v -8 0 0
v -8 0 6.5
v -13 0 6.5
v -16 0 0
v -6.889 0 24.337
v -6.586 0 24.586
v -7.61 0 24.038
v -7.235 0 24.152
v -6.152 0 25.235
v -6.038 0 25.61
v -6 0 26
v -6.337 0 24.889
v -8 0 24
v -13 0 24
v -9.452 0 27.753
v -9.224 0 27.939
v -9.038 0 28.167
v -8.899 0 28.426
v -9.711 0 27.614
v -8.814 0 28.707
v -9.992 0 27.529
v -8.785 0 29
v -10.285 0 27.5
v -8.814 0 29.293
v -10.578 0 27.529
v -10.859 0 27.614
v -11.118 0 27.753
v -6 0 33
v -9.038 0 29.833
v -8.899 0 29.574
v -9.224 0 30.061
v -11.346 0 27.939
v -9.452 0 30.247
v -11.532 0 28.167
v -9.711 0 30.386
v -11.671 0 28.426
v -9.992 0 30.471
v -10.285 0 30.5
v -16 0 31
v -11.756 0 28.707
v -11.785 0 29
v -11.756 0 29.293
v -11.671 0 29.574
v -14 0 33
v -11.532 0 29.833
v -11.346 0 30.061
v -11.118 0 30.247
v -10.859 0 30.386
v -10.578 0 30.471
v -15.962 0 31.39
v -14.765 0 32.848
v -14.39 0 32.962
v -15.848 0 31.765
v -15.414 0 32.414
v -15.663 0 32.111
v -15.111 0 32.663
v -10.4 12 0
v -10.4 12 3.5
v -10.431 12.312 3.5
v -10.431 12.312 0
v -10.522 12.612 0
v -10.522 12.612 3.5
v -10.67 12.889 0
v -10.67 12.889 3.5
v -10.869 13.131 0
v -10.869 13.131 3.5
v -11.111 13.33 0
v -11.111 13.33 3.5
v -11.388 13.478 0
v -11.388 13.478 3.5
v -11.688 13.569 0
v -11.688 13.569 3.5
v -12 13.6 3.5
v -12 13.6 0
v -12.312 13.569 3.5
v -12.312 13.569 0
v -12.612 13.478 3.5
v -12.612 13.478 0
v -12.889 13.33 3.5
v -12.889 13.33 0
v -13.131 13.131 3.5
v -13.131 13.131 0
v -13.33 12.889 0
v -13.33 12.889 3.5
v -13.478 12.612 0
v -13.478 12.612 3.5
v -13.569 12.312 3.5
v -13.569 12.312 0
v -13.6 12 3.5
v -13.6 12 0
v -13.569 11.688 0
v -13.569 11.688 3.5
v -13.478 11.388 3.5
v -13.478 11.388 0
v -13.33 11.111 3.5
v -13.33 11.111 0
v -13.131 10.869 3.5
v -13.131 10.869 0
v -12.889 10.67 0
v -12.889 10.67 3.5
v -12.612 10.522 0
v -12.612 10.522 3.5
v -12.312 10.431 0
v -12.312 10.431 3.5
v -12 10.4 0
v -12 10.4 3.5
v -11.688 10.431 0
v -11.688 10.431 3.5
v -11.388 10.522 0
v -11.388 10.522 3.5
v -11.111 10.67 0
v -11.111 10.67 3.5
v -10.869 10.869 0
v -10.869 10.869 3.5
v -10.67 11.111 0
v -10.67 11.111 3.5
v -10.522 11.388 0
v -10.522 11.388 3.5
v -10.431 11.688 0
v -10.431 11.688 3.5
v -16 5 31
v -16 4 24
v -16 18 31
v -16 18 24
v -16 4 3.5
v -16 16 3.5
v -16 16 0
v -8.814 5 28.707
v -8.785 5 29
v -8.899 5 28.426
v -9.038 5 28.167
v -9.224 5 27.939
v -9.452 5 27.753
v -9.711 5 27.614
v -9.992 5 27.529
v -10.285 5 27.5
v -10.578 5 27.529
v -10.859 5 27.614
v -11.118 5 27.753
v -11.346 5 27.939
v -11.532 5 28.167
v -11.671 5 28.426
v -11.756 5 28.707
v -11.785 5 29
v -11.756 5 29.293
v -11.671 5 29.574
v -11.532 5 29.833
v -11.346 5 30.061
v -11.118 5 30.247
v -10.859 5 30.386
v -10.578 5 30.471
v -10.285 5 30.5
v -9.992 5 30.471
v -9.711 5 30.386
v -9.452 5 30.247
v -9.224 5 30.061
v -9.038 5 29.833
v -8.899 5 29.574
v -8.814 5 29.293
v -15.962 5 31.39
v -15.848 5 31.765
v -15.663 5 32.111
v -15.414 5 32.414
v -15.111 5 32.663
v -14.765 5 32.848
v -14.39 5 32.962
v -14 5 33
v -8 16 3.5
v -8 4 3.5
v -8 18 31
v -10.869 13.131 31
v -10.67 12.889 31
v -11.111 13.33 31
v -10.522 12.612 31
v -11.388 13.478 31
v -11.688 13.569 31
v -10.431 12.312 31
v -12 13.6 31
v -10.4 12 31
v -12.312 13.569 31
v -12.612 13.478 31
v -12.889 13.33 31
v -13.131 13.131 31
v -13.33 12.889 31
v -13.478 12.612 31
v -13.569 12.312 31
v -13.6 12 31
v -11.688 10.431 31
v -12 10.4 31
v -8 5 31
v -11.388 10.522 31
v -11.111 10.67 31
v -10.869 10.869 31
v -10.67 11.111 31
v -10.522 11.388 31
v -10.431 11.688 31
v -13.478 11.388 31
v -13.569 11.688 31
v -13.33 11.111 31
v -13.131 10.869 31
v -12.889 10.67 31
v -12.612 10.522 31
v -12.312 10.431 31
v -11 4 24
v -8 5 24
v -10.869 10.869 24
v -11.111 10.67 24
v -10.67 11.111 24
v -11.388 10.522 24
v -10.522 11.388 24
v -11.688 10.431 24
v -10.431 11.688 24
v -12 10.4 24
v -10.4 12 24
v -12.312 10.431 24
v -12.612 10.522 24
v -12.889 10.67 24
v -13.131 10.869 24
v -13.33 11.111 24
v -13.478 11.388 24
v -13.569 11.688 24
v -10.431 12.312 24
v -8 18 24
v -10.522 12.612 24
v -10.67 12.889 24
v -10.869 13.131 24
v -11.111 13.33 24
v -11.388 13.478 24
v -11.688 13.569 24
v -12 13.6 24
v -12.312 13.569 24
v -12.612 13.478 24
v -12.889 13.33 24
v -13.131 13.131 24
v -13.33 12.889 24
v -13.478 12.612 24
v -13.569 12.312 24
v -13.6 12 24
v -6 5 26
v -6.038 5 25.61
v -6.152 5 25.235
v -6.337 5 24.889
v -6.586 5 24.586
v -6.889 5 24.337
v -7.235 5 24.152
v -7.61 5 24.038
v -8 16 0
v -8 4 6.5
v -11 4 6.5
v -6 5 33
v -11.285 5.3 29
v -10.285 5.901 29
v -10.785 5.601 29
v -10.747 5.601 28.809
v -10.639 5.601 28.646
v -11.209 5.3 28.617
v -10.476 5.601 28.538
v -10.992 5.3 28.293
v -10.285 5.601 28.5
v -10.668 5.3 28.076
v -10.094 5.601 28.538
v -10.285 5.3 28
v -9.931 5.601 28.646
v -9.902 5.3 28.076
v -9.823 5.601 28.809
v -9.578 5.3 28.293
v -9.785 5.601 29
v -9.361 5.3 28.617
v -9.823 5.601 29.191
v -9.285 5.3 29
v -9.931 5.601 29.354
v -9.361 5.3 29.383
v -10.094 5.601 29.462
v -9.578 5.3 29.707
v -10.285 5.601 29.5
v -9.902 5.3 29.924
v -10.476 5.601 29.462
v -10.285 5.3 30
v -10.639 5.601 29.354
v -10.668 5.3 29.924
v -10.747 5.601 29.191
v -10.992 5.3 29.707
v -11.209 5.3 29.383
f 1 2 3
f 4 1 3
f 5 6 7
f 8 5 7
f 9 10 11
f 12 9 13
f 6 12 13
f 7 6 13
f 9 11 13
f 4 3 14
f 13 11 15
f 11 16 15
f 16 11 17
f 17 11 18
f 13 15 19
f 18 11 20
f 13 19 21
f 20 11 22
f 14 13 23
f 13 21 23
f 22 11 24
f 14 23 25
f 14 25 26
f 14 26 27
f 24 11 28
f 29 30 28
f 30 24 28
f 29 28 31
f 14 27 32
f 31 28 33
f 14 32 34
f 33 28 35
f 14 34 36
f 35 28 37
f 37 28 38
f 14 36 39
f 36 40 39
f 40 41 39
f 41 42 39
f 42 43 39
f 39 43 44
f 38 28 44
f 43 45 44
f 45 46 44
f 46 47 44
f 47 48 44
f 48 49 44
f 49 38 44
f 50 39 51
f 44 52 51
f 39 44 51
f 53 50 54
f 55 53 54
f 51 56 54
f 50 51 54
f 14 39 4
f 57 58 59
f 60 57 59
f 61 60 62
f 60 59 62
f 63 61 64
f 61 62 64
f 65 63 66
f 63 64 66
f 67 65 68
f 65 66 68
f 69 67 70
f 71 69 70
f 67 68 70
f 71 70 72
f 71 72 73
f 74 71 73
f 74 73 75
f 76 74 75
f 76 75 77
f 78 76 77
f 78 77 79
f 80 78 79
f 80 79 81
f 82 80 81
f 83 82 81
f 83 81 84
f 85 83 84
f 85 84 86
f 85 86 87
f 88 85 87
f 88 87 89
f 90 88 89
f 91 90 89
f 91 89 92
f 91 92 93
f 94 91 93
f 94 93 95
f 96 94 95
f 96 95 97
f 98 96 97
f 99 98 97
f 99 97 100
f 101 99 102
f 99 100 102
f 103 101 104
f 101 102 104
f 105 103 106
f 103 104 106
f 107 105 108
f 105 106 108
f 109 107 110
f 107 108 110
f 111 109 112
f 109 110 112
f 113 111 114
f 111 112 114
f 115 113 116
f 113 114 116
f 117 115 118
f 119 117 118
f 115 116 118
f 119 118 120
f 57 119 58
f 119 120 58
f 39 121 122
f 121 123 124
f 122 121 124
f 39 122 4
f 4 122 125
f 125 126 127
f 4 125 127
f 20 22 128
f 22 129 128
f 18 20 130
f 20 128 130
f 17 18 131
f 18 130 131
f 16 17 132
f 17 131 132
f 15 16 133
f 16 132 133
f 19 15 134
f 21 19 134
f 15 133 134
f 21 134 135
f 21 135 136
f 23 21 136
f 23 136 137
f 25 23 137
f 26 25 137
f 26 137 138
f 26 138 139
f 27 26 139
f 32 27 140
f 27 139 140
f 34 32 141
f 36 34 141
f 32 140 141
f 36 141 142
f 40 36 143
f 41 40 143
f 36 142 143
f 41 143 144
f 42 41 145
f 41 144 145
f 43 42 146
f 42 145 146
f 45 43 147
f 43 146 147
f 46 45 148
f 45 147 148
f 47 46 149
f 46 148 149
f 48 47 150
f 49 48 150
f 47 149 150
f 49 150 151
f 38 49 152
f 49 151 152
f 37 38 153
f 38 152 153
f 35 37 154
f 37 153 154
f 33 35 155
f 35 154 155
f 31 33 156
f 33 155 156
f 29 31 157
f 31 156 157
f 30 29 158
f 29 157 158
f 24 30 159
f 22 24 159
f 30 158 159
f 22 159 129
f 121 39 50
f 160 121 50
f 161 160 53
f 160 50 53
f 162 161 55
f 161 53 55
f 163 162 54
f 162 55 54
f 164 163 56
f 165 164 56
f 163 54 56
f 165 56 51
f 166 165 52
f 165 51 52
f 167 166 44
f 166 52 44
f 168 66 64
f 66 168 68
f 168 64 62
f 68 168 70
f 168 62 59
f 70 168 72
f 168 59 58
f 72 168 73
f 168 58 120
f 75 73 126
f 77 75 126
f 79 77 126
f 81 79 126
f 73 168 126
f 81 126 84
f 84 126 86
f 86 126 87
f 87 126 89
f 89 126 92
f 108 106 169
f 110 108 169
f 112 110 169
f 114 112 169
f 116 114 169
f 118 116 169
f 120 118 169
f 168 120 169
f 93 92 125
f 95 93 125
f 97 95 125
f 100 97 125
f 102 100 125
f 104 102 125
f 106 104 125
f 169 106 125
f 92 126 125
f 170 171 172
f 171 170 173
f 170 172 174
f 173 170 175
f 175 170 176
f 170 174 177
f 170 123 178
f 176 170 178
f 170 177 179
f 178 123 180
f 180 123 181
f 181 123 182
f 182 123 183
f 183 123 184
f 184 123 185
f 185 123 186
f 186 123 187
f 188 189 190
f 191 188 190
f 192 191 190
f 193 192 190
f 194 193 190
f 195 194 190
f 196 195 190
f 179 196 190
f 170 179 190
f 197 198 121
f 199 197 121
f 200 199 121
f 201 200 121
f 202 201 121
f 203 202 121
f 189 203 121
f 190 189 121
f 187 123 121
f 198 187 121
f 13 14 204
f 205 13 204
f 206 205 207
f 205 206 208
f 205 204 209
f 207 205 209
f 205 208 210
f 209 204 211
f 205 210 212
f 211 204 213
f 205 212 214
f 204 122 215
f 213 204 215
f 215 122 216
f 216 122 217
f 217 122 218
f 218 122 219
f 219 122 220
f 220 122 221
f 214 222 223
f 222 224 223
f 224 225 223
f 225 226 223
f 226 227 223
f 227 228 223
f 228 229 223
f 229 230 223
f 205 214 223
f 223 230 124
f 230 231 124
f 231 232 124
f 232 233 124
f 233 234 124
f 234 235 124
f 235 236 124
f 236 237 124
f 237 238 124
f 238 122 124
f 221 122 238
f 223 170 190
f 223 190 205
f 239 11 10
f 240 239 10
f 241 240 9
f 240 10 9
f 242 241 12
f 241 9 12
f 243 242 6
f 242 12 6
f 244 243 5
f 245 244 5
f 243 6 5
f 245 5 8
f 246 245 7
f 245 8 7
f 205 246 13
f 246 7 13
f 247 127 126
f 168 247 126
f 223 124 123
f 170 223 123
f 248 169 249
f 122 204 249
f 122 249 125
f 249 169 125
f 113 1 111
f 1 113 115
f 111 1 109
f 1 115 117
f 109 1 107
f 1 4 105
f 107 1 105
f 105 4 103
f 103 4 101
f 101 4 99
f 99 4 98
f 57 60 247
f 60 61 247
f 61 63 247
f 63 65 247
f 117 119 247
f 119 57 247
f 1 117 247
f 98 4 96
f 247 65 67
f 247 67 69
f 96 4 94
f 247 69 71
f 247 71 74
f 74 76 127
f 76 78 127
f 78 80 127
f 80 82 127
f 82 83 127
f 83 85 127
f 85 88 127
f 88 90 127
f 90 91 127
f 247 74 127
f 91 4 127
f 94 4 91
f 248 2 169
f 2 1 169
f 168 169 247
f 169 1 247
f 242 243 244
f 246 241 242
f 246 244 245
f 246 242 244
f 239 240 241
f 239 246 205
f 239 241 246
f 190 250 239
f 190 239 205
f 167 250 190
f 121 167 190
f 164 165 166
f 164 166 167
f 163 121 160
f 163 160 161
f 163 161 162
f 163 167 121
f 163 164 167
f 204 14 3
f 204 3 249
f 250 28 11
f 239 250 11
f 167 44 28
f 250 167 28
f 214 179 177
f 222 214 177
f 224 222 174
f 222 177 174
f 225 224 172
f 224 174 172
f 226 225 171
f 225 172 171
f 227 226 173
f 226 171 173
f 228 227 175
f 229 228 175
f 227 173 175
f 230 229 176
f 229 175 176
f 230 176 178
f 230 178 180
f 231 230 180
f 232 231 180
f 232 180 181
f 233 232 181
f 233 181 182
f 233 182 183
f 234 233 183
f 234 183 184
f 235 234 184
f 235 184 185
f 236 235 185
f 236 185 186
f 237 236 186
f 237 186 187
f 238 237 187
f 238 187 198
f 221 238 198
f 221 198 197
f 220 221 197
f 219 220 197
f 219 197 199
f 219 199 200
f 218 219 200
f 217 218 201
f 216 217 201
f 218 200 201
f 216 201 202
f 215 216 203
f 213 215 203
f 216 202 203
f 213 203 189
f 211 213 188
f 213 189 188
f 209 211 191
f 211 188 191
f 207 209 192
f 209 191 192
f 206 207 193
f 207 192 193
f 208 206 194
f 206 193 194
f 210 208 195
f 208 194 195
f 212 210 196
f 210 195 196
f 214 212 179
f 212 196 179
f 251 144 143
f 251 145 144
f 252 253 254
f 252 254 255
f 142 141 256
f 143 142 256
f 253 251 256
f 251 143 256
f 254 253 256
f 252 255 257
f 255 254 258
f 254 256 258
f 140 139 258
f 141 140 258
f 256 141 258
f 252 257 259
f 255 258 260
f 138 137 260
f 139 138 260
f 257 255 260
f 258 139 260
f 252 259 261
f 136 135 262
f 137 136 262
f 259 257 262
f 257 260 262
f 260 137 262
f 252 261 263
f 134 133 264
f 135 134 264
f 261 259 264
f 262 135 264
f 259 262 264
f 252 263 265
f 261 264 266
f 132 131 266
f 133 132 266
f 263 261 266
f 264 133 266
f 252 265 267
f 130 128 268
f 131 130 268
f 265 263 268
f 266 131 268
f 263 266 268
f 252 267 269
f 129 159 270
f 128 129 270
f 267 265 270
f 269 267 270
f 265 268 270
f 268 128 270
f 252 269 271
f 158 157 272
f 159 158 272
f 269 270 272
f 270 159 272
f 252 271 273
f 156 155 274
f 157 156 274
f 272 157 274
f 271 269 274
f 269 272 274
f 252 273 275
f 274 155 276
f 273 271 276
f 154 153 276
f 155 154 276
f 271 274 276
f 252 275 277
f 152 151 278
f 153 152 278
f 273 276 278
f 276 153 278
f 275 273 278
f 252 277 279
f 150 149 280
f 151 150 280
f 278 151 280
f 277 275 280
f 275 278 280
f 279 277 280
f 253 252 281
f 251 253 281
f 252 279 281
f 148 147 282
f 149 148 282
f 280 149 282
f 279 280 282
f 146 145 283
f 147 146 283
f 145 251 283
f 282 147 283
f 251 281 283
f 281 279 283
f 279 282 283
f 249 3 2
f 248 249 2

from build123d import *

# Parameters (mm, degrees)
BOSS_EXTRUDE1_DEPTH       = 8
CUT_EXTRUDE2_DEPTH        = 20.5
SKETCH6_W                 = 35.270415117
SKETCH6_H                 = 22.226622545
CUT_EXTRUDE3_DEPTH        = 8
BOSS_EXTRUDE2_DEPTH       = 3
BOSS_EXTRUDE7_DEPTH       = 5
SKETCH7_R                 = 1.6
CUT_EXTRUDE6_DEPTH        = 40.255572853
F_3_0MM_DOWEL_HOLE1_D     = 3
F_3_0MM_DOWEL_HOLE1_DEPTH = 5
F_3_0MM_DOWEL_HOLE1_TIP   = 0.901290929


with BuildPart() as part:
    # Sketch1 → Boss-Extrude1 (new body)
    with BuildSketch(Plane(origin=(0, 0, 0), x_dir=(0, 0, -1), z_dir=(1, 0, 0))):
        Polygon((0, 0), (0, 16), (-3.5, 16), (-3.5, 4), (-24, 4), (-24, 18), (-31, 18), (-31, 0), align=None)
    boss_extrude1 = extrude(amount=-BOSS_EXTRUDE1_DEPTH)

    # Sketch5 → Cut-Extrude2 (cut)
    with BuildSketch(Plane.XY.offset(3.5)):
        Polygon((-8, 0), (-3, 0), (-5, 4), (-8, 4), align=None)
    cut_extrude2 = extrude(amount=CUT_EXTRUDE2_DEPTH, mode=Mode.SUBTRACT)

    # Mirror1: Boss-Extrude1, Cut-Extrude2 across plane
    add(boss_extrude1.mirror(Plane(origin=(-8, 0, 0), x_dir=(0, 0, 1), z_dir=(1, 0, 0))))
    add(cut_extrude2.mirror(Plane(origin=(-8, 0, 0), x_dir=(0, 0, 1), z_dir=(1, 0, 0))), mode=Mode.SUBTRACT)

    # Sketch6 → Cut-Extrude3 (cut)
    with BuildSketch(Plane(origin=(0, 0, 0), x_dir=(0, 0, -1), z_dir=(1, 0, 0))):
        with Locations((-16.260875851, 8.713036563)):
            Rectangle(SKETCH6_W, SKETCH6_H)
    extrude(amount=-CUT_EXTRUDE3_DEPTH, mode=Mode.SUBTRACT)

    # Sketch9 → Boss-Extrude2 (add)
    with BuildSketch(Plane.XY.offset(3.5)):
        Polygon((-11, 4), (-13, 0), (-8, 0), (-8, 4), align=None)
    extrude(amount=BOSS_EXTRUDE2_DEPTH)

    # Sketch13 → Boss-Extrude7 (add)
    with BuildSketch(Plane.XZ):
        with BuildLine():
            Line((-14, 33), (-6, 33))
            Line((-6, 33), (-6, 26))
            ThreePointArc((-6, 26), (-6.585786438, 24.585786438), (-8, 24))
            Line((-8, 24), (-8, 31))
            Line((-8, 31), (-16, 31))
            ThreePointArc((-16, 31), (-15.414213562, 32.414213562), (-14, 33))
        make_face()
    extrude(amount=-BOSS_EXTRUDE7_DEPTH)

    # Sketch7 → Cut-Extrude6 (cut, through all)
    with BuildSketch(Plane.XY.offset(31)):
        with Locations((-12, 12)):
            Circle(SKETCH7_R)
    extrude(amount=-CUT_EXTRUDE6_DEPTH, mode=Mode.SUBTRACT)

    # Ø3.0mm Dowel Hole1
    with Locations(Plane(origin=(0, 0, 0), x_dir=(-1, 0, 0), z_dir=(0, -1, 0))):
        with Locations((10.285, -29)):
            Hole(F_3_0MM_DOWEL_HOLE1_D / 2, depth=F_3_0MM_DOWEL_HOLE1_DEPTH)
            with Locations((0, 0, -(F_3_0MM_DOWEL_HOLE1_DEPTH + F_3_0MM_DOWEL_HOLE1_TIP / 2))):  # 118° drill point
                Cone(0, F_3_0MM_DOWEL_HOLE1_D / 2, F_3_0MM_DOWEL_HOLE1_TIP, mode=Mode.SUBTRACT)


solid = part.part
